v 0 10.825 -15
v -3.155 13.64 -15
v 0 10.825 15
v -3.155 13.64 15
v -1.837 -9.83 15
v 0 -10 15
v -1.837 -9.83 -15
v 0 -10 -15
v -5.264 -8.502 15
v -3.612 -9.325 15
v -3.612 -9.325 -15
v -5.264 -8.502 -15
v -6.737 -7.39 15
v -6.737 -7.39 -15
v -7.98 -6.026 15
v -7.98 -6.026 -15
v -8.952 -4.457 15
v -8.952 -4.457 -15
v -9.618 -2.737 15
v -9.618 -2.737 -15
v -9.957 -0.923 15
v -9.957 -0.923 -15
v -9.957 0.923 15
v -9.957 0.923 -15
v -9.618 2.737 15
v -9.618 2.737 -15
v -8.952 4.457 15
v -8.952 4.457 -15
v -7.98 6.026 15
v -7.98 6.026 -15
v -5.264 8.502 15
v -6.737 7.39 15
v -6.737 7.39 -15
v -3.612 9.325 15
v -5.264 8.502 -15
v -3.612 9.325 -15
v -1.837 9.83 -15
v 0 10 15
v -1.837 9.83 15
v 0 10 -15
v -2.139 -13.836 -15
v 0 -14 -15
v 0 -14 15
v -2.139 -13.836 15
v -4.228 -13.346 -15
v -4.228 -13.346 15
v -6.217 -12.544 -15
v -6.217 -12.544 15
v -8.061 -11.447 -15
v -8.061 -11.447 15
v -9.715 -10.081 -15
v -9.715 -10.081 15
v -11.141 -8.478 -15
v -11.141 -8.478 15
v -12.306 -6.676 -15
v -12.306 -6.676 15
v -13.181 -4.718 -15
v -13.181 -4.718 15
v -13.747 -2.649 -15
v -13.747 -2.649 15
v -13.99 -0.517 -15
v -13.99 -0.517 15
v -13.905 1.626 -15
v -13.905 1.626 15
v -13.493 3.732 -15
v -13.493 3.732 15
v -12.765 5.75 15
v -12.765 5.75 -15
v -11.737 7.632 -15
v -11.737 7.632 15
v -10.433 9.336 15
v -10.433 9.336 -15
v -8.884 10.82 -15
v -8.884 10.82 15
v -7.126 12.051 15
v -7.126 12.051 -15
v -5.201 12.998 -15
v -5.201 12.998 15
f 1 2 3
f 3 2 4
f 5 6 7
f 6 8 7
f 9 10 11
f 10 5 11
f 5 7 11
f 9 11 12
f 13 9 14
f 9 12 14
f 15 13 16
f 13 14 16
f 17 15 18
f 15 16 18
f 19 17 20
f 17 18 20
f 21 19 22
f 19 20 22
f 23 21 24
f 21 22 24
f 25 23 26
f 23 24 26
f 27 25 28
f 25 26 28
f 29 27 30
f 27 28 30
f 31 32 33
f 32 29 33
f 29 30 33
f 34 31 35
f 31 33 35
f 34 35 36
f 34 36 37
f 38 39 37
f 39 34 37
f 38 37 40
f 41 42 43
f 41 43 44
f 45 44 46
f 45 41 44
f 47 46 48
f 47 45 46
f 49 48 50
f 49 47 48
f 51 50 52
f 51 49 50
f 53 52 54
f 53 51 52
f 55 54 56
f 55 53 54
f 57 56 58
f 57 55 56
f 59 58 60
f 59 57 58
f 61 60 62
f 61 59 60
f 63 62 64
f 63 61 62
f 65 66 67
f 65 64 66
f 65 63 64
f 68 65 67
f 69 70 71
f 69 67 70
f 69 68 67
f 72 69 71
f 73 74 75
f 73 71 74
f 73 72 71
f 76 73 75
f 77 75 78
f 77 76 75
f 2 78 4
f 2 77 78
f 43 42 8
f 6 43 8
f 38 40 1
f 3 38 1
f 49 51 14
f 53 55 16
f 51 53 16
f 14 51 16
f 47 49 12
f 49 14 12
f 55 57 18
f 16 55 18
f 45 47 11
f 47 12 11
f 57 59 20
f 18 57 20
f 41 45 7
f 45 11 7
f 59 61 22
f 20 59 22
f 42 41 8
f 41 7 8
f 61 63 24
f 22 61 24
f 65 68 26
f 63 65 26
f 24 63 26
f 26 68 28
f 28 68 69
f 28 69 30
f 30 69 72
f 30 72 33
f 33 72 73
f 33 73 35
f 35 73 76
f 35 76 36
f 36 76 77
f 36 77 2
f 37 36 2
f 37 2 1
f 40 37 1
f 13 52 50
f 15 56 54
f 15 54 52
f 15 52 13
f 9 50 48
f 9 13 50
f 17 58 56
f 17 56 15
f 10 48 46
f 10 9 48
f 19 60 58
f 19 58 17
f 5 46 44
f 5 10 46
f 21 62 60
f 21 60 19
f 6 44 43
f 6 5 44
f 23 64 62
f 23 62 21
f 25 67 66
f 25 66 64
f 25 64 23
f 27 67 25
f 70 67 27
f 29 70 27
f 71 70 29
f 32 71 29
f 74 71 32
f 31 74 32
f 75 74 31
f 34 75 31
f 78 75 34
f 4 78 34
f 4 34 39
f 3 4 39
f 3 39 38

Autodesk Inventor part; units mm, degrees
ref_plane "YZ Plane" through (0, 0, 0) normal (1, 0, 0) x (0, 1, 0)
ref_plane "XZ Plane" through (0, 0, 0) normal (0, 1, 0) x (-1, 0, 0)
ref_plane "Work Plane1" through (0, 0, 0) normal (0, 0, 1) x (1, 0, 0)
sketch "Sketch1" plane through (0, 0, 0) normal (0, 0, 1) x (1, 0, 0)
  circle A0 centre (0, 0) radius 14
  circle A1 centre (0, 0) radius 10
  line L0 (0, -14) -> (0, 14)
  point P0 (0, 10)
  point P1 (0, -10)
  dimension "d1" = 4
  dimension "d4" = 20
extrude "Extrusion1" add sketch "Sketch1" along normal mid plane 30 contours L0 A1 A0 picked at (-1.9145, -12.4342)
chamfer "Chamfer1" distance 3.175 angle 45 1 edges at (0, 14, 0)
properties part number "2101_Tx_Coil_Spacer_v1" material "Acetal Resin, White"
